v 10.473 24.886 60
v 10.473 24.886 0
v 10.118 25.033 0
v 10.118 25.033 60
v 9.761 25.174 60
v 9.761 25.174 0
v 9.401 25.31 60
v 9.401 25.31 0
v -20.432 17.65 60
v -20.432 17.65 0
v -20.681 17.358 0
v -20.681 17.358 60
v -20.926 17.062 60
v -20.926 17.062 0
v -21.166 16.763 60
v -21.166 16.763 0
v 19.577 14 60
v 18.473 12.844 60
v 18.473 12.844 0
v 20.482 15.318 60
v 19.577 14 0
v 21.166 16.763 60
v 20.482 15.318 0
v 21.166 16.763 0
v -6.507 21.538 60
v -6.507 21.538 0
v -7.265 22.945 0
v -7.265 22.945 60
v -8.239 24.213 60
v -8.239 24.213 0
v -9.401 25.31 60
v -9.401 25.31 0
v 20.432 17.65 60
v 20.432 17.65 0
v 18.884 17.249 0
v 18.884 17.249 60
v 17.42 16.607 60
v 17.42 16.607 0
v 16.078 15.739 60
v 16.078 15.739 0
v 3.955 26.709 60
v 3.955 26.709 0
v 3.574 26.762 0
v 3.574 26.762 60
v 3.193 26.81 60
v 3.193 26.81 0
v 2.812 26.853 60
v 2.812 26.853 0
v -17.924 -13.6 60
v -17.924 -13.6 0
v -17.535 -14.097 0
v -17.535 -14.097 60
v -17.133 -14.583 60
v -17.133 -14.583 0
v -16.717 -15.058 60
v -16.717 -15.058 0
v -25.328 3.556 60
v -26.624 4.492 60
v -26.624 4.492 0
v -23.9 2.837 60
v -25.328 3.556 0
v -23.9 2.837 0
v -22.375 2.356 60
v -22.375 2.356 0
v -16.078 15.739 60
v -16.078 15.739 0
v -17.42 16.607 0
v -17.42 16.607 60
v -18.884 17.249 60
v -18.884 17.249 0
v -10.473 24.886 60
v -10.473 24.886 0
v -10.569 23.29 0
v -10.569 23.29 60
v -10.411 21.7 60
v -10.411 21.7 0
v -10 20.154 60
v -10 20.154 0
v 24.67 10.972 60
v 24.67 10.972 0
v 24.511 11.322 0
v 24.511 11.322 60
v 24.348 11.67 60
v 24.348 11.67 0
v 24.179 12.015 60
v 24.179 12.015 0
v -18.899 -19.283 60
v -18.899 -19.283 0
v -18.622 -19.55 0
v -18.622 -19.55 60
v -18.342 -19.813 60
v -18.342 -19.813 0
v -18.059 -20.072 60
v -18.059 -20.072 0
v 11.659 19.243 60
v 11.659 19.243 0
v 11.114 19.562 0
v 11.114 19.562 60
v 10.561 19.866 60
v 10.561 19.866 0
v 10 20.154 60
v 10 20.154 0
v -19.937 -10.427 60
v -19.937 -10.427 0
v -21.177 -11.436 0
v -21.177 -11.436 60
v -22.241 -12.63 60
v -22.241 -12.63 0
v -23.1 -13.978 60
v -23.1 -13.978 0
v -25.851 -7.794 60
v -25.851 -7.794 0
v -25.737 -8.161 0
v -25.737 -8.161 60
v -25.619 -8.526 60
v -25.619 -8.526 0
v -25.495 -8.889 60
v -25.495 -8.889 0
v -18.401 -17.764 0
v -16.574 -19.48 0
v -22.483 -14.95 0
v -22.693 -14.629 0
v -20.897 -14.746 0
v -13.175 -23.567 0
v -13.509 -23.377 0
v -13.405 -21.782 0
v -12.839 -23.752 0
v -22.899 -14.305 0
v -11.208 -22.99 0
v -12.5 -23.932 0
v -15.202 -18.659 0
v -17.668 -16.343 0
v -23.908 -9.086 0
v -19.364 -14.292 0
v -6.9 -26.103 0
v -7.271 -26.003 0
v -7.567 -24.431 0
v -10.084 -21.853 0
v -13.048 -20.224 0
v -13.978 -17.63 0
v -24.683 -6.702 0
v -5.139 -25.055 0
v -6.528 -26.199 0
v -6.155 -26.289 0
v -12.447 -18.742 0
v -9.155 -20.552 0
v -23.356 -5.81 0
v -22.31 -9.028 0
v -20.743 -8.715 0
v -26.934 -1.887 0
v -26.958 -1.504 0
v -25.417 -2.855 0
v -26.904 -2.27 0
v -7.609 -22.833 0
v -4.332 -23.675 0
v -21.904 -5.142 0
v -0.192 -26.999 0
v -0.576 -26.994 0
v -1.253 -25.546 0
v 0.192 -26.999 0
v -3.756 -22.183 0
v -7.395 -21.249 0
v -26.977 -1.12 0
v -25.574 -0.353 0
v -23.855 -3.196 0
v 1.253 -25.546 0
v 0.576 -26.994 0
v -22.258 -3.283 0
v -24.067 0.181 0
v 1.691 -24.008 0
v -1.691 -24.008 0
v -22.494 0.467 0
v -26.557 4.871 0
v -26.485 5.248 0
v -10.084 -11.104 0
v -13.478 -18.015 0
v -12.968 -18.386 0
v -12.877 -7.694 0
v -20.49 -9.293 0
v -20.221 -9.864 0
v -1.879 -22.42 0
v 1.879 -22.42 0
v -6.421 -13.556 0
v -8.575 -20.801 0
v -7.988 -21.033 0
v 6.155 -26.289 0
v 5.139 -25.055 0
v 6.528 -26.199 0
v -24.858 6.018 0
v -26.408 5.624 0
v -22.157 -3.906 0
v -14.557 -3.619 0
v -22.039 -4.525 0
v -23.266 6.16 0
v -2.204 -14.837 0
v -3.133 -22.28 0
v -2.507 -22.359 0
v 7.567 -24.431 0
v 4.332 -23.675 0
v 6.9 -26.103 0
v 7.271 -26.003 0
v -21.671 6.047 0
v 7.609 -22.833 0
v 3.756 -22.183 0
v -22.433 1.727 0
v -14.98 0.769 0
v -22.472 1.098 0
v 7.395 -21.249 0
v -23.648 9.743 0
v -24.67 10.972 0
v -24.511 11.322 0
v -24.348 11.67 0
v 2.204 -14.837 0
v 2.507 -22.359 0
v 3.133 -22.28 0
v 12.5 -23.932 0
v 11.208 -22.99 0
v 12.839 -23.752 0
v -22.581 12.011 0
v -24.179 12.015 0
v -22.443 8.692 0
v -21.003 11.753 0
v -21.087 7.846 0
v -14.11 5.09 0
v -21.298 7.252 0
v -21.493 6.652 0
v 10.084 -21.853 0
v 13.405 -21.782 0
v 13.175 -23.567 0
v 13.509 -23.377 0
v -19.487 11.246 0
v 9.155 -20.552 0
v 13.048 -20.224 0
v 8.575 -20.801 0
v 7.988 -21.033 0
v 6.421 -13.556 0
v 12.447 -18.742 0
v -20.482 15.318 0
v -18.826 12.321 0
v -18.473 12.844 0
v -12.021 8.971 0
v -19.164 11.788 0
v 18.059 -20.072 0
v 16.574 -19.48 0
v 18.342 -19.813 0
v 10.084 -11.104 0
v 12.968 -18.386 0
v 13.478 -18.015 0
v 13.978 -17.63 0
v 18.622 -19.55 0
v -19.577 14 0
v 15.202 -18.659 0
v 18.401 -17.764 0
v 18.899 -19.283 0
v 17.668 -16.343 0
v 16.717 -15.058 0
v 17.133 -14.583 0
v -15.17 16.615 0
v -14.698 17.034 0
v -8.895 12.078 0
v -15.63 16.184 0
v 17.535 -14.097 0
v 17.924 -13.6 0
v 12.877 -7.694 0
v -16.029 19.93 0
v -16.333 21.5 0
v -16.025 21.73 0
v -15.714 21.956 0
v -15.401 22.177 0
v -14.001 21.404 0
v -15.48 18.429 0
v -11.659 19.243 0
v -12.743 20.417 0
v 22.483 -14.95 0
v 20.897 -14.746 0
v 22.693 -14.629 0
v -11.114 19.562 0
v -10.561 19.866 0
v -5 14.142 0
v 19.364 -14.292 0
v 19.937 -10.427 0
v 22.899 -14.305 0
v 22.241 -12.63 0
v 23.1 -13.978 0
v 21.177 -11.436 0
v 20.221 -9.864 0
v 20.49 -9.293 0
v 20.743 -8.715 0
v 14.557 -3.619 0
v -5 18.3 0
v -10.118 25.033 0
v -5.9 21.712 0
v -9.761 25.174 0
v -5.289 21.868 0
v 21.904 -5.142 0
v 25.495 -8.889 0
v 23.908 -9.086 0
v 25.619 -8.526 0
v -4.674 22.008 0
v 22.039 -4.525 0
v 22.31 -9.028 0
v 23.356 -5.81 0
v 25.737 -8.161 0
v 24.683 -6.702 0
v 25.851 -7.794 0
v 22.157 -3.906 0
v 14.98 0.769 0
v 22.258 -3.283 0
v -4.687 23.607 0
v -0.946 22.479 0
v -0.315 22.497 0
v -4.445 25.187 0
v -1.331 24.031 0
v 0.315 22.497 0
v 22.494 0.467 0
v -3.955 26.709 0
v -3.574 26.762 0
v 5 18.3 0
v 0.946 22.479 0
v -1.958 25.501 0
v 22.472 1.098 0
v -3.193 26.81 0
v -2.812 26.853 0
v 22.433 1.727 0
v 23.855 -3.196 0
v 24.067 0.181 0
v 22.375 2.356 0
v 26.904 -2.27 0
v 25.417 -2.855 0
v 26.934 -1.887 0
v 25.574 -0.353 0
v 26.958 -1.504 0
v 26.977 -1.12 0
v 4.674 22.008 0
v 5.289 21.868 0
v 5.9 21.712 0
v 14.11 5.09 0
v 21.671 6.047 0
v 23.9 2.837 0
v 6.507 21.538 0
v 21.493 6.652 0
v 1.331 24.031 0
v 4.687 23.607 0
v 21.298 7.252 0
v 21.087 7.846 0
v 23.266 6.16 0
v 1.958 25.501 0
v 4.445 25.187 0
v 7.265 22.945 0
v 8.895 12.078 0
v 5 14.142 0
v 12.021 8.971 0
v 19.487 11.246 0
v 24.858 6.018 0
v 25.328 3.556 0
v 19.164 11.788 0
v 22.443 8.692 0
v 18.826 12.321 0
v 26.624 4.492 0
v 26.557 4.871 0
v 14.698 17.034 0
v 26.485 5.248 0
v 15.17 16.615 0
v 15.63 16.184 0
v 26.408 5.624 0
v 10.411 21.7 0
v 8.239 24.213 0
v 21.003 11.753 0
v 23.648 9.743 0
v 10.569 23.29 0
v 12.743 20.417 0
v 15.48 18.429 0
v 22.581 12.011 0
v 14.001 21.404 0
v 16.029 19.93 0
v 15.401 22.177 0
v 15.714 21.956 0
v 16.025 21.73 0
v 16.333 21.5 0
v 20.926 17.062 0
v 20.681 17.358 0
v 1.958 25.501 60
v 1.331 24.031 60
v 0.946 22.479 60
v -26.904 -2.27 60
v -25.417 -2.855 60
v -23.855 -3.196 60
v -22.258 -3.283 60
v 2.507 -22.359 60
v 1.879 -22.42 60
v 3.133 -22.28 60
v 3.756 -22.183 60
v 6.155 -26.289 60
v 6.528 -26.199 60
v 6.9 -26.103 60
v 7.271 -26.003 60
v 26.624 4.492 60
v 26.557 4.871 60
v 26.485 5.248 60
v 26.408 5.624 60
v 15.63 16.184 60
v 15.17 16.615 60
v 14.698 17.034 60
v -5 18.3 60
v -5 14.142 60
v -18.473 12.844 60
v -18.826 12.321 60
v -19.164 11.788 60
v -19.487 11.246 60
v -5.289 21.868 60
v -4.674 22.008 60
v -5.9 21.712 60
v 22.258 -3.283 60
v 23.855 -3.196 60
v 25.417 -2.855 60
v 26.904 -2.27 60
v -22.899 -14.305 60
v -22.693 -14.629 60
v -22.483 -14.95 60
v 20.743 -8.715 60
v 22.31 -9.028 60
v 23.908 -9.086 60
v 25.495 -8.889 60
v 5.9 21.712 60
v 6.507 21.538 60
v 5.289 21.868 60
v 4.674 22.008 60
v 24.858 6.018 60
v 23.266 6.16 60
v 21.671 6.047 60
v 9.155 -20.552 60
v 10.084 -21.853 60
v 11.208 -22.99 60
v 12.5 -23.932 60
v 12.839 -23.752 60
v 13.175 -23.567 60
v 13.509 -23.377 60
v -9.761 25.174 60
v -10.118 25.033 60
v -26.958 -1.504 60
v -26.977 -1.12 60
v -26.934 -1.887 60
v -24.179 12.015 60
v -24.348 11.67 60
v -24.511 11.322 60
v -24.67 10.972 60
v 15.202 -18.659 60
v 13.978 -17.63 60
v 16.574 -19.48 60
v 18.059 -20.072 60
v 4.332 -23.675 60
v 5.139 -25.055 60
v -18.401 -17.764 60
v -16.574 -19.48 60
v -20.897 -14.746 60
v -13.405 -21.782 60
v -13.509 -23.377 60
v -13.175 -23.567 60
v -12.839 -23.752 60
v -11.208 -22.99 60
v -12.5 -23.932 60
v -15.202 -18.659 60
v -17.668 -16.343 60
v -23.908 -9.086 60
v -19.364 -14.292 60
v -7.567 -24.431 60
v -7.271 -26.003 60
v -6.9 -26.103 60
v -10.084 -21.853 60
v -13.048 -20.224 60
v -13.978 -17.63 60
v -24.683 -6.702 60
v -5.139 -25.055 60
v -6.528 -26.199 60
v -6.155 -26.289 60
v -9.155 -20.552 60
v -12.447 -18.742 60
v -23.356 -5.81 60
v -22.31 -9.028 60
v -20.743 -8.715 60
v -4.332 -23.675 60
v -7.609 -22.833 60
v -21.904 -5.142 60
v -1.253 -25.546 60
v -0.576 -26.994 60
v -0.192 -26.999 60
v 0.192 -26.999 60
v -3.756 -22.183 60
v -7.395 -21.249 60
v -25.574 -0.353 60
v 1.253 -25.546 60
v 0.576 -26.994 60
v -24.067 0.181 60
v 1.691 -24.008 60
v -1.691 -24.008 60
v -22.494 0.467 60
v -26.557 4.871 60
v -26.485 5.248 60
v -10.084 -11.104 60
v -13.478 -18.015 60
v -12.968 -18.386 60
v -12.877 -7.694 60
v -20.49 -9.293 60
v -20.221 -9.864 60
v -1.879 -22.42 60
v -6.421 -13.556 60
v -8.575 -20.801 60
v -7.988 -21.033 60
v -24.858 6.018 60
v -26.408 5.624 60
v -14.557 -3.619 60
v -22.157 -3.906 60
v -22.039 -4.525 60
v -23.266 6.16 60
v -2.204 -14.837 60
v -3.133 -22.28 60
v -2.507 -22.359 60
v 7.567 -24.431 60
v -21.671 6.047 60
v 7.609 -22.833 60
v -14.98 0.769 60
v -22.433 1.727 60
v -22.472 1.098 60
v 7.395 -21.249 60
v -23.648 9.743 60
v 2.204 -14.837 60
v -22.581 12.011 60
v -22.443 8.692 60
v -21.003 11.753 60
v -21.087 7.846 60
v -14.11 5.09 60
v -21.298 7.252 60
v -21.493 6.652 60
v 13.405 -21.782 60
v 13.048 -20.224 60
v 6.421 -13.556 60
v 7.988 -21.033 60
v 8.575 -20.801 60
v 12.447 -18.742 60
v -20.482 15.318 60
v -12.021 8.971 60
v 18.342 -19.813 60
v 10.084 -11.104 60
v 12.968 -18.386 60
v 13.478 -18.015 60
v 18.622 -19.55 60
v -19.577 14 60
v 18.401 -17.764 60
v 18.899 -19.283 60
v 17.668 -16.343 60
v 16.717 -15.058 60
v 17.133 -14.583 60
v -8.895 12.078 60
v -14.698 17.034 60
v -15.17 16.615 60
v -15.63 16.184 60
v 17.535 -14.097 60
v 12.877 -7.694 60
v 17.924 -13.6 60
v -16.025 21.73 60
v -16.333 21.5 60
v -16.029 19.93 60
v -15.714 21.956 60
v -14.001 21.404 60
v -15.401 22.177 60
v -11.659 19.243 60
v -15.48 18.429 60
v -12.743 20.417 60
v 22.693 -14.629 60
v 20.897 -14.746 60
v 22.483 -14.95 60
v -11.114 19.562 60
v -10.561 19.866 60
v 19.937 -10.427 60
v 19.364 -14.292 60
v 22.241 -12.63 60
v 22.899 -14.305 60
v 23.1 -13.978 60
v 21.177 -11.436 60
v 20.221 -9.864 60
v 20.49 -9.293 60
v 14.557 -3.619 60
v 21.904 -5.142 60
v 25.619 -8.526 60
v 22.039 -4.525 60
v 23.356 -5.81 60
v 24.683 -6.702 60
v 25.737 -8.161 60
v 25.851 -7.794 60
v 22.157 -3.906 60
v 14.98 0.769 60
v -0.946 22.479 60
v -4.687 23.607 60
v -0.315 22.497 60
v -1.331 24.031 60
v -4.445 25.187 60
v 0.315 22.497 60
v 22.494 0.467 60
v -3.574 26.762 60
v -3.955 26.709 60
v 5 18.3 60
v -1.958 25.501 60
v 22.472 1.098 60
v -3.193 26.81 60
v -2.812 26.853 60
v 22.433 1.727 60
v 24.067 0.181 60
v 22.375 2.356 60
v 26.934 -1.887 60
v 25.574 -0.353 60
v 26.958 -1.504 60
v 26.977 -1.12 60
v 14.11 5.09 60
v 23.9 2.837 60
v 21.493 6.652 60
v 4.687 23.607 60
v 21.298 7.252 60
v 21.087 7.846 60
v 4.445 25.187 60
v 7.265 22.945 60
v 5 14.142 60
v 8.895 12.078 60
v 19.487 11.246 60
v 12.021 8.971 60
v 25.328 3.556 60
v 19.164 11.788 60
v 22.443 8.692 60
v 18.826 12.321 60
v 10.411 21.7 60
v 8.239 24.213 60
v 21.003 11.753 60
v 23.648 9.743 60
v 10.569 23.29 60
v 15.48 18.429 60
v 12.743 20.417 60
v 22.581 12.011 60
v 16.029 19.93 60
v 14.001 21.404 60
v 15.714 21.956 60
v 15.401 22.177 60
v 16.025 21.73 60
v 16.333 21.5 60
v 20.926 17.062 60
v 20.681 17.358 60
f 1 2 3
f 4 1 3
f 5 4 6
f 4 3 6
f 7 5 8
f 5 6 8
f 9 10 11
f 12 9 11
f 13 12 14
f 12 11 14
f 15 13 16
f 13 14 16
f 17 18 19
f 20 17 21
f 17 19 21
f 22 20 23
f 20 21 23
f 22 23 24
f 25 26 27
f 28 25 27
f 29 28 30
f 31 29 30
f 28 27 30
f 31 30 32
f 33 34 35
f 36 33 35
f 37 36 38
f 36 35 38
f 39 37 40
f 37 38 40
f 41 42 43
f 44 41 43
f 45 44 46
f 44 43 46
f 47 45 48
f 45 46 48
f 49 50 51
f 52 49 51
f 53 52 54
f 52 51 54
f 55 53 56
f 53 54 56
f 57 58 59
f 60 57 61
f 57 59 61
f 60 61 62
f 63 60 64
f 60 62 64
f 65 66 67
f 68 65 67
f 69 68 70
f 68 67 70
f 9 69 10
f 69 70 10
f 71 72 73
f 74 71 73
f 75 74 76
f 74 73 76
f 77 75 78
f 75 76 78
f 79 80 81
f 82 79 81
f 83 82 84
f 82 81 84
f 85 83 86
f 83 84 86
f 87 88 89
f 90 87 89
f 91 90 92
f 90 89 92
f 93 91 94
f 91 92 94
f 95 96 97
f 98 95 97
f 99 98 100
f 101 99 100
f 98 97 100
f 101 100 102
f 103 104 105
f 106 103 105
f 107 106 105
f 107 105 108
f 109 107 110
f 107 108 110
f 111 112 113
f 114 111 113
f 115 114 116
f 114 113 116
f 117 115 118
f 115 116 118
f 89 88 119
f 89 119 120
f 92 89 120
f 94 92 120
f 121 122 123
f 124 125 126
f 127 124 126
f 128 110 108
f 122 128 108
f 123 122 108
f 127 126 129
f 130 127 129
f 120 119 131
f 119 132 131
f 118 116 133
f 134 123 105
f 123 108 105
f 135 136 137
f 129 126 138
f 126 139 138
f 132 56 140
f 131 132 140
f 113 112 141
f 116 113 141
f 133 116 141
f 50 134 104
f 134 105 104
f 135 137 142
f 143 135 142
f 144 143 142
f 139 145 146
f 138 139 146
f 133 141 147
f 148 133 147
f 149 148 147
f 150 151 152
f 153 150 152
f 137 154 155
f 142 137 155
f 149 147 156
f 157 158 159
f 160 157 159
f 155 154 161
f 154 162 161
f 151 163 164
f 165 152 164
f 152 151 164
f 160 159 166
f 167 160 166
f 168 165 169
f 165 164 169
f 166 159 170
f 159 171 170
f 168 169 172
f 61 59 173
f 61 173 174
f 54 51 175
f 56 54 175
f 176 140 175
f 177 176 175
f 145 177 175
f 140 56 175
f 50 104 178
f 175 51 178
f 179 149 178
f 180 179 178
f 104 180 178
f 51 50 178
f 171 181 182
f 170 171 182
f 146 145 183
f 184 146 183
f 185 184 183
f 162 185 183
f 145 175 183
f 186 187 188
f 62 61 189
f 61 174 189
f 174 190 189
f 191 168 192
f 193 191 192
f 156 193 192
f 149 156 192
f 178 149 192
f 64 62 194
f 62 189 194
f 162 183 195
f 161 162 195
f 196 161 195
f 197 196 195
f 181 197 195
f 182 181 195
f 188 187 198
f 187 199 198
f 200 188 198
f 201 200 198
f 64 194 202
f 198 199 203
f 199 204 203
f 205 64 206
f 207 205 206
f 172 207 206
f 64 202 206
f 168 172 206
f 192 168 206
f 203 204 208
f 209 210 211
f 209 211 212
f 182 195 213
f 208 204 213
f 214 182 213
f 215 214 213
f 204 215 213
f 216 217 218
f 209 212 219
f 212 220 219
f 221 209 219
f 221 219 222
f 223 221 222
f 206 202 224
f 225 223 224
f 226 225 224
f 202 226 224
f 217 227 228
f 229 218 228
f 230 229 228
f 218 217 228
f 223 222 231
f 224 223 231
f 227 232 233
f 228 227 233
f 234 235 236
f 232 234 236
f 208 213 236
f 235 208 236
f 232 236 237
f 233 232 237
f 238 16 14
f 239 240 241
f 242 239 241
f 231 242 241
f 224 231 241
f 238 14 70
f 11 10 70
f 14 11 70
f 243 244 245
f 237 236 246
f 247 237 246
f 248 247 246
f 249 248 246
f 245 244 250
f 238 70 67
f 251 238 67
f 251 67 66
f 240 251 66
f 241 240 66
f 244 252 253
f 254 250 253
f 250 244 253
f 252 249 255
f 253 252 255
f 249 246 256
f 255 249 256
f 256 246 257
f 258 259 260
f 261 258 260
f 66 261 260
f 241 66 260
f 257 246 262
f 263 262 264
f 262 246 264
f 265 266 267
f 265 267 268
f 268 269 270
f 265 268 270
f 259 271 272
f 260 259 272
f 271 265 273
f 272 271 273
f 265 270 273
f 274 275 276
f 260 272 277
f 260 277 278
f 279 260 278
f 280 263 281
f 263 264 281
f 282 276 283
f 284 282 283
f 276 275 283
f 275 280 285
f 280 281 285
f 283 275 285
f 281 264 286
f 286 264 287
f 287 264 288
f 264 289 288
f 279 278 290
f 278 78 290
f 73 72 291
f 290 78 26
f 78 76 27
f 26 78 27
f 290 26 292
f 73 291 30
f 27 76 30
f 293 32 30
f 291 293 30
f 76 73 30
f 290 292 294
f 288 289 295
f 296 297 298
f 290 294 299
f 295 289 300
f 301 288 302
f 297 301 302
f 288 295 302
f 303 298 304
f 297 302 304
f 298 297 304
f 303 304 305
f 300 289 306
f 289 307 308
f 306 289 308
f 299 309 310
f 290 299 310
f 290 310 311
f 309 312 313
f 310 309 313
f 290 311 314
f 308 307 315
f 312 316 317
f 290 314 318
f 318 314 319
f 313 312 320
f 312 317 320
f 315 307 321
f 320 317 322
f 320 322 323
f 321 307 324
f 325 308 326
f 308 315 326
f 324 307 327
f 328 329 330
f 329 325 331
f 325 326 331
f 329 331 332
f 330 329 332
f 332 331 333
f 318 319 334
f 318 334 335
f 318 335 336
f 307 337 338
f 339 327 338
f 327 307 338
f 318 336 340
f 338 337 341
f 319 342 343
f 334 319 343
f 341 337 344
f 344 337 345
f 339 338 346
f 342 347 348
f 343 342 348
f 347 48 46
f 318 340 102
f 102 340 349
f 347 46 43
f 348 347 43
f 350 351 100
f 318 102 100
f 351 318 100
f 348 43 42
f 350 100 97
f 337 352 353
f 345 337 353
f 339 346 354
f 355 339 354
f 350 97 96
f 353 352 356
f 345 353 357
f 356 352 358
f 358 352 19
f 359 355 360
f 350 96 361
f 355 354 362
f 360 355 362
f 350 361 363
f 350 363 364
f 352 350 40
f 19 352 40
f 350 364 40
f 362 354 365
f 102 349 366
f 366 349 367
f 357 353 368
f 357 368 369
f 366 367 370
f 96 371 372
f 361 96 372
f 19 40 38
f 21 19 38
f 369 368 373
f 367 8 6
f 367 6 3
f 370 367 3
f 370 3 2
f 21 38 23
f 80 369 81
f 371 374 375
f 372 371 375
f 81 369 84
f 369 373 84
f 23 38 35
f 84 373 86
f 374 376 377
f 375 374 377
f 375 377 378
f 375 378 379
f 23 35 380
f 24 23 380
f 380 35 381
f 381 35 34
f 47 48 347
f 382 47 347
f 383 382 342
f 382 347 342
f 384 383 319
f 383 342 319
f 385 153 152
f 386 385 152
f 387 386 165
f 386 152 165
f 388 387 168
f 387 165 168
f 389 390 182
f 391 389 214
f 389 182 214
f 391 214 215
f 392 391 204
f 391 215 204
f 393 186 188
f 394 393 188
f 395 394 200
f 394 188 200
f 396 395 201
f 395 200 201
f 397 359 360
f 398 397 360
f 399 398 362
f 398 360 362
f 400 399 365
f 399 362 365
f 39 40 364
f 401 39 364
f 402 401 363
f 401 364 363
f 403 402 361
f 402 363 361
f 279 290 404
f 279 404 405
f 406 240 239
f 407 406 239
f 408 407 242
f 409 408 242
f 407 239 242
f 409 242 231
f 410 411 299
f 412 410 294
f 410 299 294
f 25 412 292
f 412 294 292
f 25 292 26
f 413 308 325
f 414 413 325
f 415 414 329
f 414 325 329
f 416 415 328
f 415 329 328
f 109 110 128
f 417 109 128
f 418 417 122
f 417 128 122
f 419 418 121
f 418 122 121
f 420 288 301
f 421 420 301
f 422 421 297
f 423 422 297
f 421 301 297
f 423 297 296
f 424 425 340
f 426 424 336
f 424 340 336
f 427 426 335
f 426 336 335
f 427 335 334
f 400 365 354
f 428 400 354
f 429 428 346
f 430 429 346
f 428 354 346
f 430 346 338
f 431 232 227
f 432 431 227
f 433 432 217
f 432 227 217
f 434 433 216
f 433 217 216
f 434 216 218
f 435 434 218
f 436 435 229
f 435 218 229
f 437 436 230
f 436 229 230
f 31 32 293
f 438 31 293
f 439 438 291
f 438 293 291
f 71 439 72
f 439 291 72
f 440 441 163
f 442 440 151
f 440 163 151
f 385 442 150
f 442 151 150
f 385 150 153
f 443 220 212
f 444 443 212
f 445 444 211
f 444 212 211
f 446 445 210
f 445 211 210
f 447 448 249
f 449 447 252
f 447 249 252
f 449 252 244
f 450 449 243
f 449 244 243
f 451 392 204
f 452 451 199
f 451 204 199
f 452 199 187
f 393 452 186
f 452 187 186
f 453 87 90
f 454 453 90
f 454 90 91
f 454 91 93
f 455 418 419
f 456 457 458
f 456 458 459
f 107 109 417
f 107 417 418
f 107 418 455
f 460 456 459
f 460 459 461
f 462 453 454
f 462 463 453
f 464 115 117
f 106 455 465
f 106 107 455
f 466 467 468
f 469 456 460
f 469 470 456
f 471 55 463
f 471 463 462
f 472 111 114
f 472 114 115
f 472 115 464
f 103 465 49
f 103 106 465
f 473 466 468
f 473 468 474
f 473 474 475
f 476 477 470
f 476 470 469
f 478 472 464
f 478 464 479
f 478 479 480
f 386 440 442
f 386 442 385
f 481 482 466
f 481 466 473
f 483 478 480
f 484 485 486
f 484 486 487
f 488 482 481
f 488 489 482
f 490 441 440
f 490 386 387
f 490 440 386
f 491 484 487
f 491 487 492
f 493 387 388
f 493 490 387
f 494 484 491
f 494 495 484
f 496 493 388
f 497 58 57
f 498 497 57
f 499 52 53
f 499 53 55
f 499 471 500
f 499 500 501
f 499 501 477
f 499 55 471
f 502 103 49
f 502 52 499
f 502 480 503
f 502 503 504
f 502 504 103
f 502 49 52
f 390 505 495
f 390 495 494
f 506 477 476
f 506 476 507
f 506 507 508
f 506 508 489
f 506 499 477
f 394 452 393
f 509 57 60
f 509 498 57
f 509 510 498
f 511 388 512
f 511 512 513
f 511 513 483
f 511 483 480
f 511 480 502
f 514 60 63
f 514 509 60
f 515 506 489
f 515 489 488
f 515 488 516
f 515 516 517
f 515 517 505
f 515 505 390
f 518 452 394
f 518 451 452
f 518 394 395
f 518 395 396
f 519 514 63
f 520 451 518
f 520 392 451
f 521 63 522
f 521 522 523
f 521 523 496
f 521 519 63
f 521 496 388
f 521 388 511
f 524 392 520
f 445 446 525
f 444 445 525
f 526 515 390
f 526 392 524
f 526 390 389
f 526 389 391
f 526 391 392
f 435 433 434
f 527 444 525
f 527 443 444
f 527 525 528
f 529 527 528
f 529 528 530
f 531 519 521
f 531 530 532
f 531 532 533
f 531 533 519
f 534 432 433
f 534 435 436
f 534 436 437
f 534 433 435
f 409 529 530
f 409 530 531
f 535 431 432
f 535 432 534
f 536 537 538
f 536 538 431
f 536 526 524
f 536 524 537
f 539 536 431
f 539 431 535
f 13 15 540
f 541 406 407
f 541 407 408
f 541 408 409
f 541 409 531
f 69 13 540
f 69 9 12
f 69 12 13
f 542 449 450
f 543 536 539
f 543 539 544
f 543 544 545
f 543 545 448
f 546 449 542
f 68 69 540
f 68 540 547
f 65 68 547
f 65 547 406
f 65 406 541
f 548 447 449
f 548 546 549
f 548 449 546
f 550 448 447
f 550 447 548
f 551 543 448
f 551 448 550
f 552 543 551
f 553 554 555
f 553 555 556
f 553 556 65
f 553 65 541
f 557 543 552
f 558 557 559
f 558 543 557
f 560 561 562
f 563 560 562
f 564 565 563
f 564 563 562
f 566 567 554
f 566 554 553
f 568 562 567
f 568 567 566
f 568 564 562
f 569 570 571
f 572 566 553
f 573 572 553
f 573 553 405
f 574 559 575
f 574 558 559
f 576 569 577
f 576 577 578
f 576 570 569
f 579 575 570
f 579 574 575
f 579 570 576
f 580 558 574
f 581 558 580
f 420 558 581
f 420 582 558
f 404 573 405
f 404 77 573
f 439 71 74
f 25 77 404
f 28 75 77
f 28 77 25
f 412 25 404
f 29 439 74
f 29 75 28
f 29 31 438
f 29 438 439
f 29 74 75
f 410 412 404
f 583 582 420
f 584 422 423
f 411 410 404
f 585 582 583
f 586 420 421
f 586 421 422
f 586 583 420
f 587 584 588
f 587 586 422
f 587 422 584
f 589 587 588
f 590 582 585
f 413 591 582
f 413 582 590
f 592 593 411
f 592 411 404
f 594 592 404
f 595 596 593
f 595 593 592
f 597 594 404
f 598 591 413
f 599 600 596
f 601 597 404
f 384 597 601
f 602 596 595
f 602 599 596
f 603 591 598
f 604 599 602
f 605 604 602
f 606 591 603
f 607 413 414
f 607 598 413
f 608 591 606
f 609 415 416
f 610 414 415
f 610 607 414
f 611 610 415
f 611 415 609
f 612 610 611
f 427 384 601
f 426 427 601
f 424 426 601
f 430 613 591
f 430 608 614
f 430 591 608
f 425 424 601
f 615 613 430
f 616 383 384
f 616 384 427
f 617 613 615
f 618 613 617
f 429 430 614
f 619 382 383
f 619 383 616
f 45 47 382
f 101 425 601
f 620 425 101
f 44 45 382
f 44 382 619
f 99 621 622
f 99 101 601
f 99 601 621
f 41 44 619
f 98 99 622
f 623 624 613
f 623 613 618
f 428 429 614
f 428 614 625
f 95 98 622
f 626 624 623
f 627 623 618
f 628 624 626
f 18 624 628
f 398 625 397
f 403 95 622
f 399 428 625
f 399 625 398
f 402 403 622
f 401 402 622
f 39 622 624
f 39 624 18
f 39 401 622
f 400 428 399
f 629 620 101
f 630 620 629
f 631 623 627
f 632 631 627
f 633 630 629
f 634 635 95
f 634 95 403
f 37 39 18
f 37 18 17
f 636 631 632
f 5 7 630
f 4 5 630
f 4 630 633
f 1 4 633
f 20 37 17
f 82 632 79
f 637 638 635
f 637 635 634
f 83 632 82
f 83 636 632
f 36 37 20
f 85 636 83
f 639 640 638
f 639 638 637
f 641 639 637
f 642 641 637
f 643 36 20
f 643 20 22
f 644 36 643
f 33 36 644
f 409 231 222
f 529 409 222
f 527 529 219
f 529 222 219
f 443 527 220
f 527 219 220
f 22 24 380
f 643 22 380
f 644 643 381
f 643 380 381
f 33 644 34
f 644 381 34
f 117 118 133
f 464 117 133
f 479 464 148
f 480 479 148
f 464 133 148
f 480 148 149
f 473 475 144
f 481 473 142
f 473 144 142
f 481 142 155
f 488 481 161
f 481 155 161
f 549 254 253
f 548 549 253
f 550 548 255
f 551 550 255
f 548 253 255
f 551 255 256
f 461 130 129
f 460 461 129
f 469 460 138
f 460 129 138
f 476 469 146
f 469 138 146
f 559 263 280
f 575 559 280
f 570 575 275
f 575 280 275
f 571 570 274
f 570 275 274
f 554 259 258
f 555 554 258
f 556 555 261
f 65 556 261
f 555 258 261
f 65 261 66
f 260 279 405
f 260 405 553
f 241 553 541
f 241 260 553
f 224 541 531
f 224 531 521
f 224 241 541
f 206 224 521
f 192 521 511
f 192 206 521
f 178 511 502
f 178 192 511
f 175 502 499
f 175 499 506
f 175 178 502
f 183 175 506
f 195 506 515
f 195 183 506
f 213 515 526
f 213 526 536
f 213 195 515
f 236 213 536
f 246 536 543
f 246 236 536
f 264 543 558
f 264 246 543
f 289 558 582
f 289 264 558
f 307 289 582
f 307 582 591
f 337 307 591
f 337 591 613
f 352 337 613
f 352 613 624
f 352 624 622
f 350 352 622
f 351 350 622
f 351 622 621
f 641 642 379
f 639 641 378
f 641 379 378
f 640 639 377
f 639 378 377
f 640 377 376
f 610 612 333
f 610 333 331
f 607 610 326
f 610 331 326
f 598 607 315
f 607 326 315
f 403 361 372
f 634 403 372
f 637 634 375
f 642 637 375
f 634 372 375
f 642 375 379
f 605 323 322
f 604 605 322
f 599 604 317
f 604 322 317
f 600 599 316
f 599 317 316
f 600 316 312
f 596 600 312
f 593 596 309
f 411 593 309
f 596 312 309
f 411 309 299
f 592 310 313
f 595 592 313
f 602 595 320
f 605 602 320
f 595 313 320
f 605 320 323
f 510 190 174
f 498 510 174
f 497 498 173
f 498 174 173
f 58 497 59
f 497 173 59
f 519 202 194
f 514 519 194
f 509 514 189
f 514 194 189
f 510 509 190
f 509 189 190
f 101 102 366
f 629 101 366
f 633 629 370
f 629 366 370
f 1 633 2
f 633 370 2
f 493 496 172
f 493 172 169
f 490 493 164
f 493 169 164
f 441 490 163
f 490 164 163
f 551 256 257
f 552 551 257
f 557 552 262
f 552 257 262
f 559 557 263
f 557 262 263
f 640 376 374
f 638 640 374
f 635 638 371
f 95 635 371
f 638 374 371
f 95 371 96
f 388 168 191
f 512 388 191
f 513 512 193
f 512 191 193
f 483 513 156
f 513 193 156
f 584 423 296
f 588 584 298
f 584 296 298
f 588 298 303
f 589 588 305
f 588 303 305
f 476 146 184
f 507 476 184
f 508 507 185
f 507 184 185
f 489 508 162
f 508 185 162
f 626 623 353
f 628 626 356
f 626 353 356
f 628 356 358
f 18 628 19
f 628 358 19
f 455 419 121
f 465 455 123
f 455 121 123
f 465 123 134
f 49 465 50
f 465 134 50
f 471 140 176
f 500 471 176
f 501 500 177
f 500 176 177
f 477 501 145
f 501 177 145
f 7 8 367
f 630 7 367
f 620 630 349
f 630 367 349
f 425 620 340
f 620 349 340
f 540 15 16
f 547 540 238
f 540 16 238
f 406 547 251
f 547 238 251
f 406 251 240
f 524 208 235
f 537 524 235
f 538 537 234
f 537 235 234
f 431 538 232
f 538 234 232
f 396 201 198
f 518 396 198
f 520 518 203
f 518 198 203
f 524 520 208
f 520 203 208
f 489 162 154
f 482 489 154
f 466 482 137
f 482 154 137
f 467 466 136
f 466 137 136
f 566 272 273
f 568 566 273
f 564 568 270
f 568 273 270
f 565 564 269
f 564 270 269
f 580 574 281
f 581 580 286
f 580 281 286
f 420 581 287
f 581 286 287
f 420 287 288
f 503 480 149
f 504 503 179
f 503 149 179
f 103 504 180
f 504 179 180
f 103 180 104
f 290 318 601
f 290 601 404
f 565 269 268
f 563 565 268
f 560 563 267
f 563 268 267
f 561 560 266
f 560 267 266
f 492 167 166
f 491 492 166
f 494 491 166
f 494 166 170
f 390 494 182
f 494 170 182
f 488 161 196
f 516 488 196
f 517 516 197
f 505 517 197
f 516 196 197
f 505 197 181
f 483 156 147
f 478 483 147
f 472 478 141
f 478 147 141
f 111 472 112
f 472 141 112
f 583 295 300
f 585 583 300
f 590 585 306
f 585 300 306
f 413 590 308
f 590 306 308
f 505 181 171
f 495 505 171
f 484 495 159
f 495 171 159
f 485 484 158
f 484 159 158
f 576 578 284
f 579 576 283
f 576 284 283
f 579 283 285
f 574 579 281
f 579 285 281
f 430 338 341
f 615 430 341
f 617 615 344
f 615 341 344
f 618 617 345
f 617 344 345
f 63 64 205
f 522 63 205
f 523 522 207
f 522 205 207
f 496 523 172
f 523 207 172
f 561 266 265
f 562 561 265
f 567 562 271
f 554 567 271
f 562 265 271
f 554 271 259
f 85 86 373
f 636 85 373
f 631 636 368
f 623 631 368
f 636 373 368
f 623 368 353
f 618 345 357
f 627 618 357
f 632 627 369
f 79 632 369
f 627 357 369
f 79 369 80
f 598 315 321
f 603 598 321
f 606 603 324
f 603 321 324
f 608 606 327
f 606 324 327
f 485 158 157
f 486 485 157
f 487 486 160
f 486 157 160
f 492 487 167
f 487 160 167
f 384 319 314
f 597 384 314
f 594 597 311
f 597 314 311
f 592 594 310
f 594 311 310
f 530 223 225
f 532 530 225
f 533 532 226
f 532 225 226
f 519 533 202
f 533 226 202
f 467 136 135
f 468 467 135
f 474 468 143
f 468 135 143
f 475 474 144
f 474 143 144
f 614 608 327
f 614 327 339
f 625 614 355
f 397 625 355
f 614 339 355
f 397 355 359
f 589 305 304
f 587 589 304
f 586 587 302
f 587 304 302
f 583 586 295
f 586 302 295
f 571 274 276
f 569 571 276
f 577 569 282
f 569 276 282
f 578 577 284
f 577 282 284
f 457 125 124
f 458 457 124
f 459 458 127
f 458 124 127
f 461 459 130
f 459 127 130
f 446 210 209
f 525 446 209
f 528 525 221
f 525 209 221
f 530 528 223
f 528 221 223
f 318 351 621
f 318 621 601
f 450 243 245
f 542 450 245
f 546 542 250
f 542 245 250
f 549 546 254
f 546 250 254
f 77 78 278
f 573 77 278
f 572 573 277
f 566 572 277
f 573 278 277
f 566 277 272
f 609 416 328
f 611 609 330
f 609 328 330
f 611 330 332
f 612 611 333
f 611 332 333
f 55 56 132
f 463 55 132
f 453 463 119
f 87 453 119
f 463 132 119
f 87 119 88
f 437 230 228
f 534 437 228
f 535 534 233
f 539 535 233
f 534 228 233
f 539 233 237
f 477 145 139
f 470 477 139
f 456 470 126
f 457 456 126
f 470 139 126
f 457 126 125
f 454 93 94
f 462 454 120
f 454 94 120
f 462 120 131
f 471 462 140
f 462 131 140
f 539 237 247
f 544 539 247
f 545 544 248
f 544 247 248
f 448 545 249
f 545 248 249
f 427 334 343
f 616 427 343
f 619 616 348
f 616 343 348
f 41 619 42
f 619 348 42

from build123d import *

# Parameters (mm, degrees)
EXTRUDE_1_DEPTH = 60


with BuildPart() as part:
    # Model → 凸台-拉伸1 (new body)
    with BuildSketch(Plane.XY):
        with BuildLine():
            ThreePointArc((-26.623667603, 4.492251481), (-24.628342026, 3.167806143), (-22.375329871, 2.355761908))
            ThreePointArc((-22.375329871, 2.355761908), (-22.454603363, 1.412723899), (-22.494148969, 0.467186424))
            ThreePointArc((-22.494148969, 0.467186424), (-24.83117158, -0.056077302), (-26.976760436, -1.119998387))
            ThreePointArc((-26.976760436, -1.119998387), (-26.946721668, -1.695344027), (-26.904413642, -2.269917752))
            ThreePointArc((-26.904413642, -2.269917752), (-24.642398725, -3.056535912), (-22.258221901, -3.282766946))
            ThreePointArc((-22.258221901, -3.282766946), (-22.100480854, -4.215892197), (-21.903638454, -5.141558466))
            ThreePointArc((-21.903638454, -5.141558466), (-24.037108806, -6.229576789), (-25.850703628, -7.793659087))
            ThreePointArc((-25.850703628, -7.793659087), (-25.67852594, -8.343458848), (-25.494656424, -8.889459704))
            ThreePointArc((-25.494656424, -8.889459704), (-23.108082884, -9.088824574), (-20.742547988, -8.715027478))
            ThreePointArc((-20.742547988, -8.715027478), (-20.357703853, -9.579608281), (-19.93684178, -10.427240328))
            ThreePointArc((-19.93684178, -10.427240328), (-21.732706083, -12.011649055), (-23.100352038, -13.977615523))
            ThreePointArc((-23.100352038, -13.977615523), (-22.796853989, -14.467323464), (-22.48297618, -14.95044421))
            ThreePointArc((-22.48297618, -14.95044421), (-20.12180121, -14.550028962), (-17.9235435, -13.599690783))
            ThreePointArc((-17.9235435, -13.599690783), (-17.335777449, -14.341402345), (-16.717340013, -15.057740331))
            ThreePointArc((-16.717340013, -15.057740331), (-18.06275751, -17.038985236), (-18.898520373, -19.28330697))
            ThreePointArc((-18.898520373, -19.28330697), (-18.48277186, -19.68215294), (-18.058607856, -20.072037323))
            ThreePointArc((-18.058607856, -20.072037323), (-15.871192762, -19.097001519), (-13.978336856, -17.6298355))
            ThreePointArc((-13.978336856, -17.6298355), (-13.224580391, -18.202073356), (-12.447426292, -18.742107131))
            ThreePointArc((-12.447426292, -18.742107131), (-13.257859452, -20.995699309), (-13.509225169, -23.377357322))
            ThreePointArc((-13.509225169, -23.377357322), (-13.007349201, -23.660280361), (-12.499550786, -23.932430511))
            ThreePointArc((-12.499550786, -23.932430511), (-10.623338904, -22.444039237), (-9.154819898, -20.552232814))
            ThreePointArc((-9.154819898, -20.552232814), (-8.282434311, -20.919041156), (-7.395394998, -21.248838411))
            ThreePointArc((-7.395394998, -21.248838411), (-7.619921326, -23.633176378), (-7.271095664, -26.002522336))
            ThreePointArc((-7.271095664, -26.002522336), (-6.714626953, -26.15174535), (-6.15510097, -26.289061072))
            ThreePointArc((-6.15510097, -26.289061072), (-4.707981592, -24.380835426), (-3.756071937, -22.183257755))
            ThreePointArc((-3.756071937, -22.183257755), (-2.819872422, -22.321588665), (-1.878683838, -22.420427026))
            ThreePointArc((-1.878683838, -22.420427026), (-1.503195518, -24.785694058), (-0.576096477, -26.993853242))
            ThreePointArc((-0.576096477, -26.993853242), (0, -27), (0.576096477, -26.993853242))
            ThreePointArc((0.576096477, -26.993853242), (1.503195518, -24.785694058), (1.878683838, -22.420427026))
            ThreePointArc((1.878683838, -22.420427026), (2.819872422, -22.321588665), (3.756071937, -22.183257755))
            ThreePointArc((3.756071937, -22.183257755), (4.707981592, -24.380835426), (6.15510097, -26.289061072))
            ThreePointArc((6.15510097, -26.289061072), (6.714626953, -26.15174535), (7.271095664, -26.002522336))
            ThreePointArc((7.271095664, -26.002522336), (7.619921325, -23.633176378), (7.395394998, -21.248838411))
            ThreePointArc((7.395394998, -21.248838411), (8.282434311, -20.919041156), (9.154819898, -20.552232814))
            ThreePointArc((9.154819898, -20.552232814), (10.623338904, -22.444039237), (12.499550786, -23.932430511))
            ThreePointArc((12.499550786, -23.932430511), (13.007349201, -23.660280361), (13.509225169, -23.377357322))
            ThreePointArc((13.509225169, -23.377357322), (13.257859452, -20.995699309), (12.447426292, -18.742107131))
            ThreePointArc((12.447426292, -18.742107131), (13.224580391, -18.202073356), (13.978336856, -17.6298355))
            ThreePointArc((13.978336856, -17.6298355), (15.871192762, -19.097001519), (18.058607856, -20.072037323))
            ThreePointArc((18.058607856, -20.072037323), (18.48277186, -19.68215294), (18.898520373, -19.28330697))
            ThreePointArc((18.898520373, -19.28330697), (18.06275751, -17.038985236), (16.717340013, -15.057740331))
            ThreePointArc((16.717340013, -15.057740331), (17.335777449, -14.341402345), (17.9235435, -13.599690783))
            ThreePointArc((17.9235435, -13.599690783), (20.12180121, -14.550028962), (22.48297618, -14.95044421))
            ThreePointArc((22.48297618, -14.95044421), (22.796853989, -14.467323464), (23.100352038, -13.977615523))
            ThreePointArc((23.100352038, -13.977615523), (21.732706083, -12.011649055), (19.93684178, -10.427240328))
            ThreePointArc((19.93684178, -10.427240328), (20.357703853, -9.579608281), (20.742547988, -8.715027478))
            ThreePointArc((20.742547988, -8.715027478), (23.108082884, -9.088824574), (25.494656424, -8.889459704))
            ThreePointArc((25.494656424, -8.889459704), (25.67852594, -8.343458848), (25.850703628, -7.793659087))
            ThreePointArc((25.850703628, -7.793659087), (24.037108806, -6.229576789), (21.903638454, -5.141558466))
            ThreePointArc((21.903638454, -5.141558466), (22.100480854, -4.215892197), (22.258221901, -3.282766946))
            ThreePointArc((22.258221901, -3.282766946), (24.642398725, -3.056535912), (26.904413642, -2.269917752))
            ThreePointArc((26.904413642, -2.269917752), (26.946721668, -1.695344027), (26.976760436, -1.119998387))
            ThreePointArc((26.976760436, -1.119998387), (24.83117158, -0.056077302), (22.494148969, 0.467186424))
            ThreePointArc((22.494148969, 0.467186424), (22.454603363, 1.412723899), (22.375329871, 2.355761907))
            ThreePointArc((22.375329871, 2.355761907), (24.628342026, 3.167806143), (26.623667603, 4.492251481))
            ThreePointArc((26.623667603, 4.492251481), (26.52175577, 5.059295494), (26.407768172, 5.624035931))
            ThreePointArc((26.407768172, 5.624035931), (24.065000522, 6.120945728), (21.671269376, 6.046576272))
            ThreePointArc((21.671269376, 6.046576272), (21.39782056, 6.952573356), (21.086513575, 7.846269576))
            ThreePointArc((21.086513575, 7.846269576), (23.066796021, 9.193103287), (24.670058614, 10.972156033))
            ThreePointArc((24.670058614, 10.972156033), (24.430330417, 11.496040872), (24.179478714, 12.014691387))
            ThreePointArc((24.179478714, 12.014691387), (21.786736975, 11.913367227), (19.486704228, 11.246037495))
            ThreePointArc((19.486704228, 11.246037495), (18.996533996, 12.05556706), (18.47275408, 12.843767271))
            ThreePointArc((18.47275408, 12.843767271), (20.055878388, 14.640763942), (21.166339111, 16.762639667))
            ThreePointArc((21.166339111, 16.762639667), (20.803857555, 17.210447723), (20.431903681, 17.650419597))
            ThreePointArc((20.431903681, 17.650419597), (18.139532619, 16.957228049), (16.077717785, 15.738868823))
            ThreePointArc((16.077717785, 15.738868823), (15.401625336, 16.401065148), (14.698283508, 17.034243832))
            ThreePointArc((14.698283508, 17.034243832), (15.784776155, 19.168491554), (16.332660679, 21.499865003))
            ThreePointArc((16.332660679, 21.499865003), (15.870201812, 21.843458848), (15.400516998, 22.17710703))
            ThreePointArc((15.400516998, 22.17710703), (13.352554715, 20.935603868), (11.658509204, 19.242769139))
            ThreePointArc((11.658509204, 19.242769139), (10.838975914, 19.716023994), (10.000265727, 20.154396205))
            ThreePointArc((10.000265727, 20.154396205), (10.521858385, 22.491792344), (10.472741108, 24.88617475))
            ThreePointArc((10.472741108, 24.88617475), (9.939362922, 25.103965119), (9.401459192, 25.310325266))
            ThreePointArc((9.401459192, 25.310325266), (7.726586692, 23.5985187), (6.506753613, 21.5375755))
            ThreePointArc((6.506753613, 21.5375755), (5.595273771, 21.792152542), (4.673894472, 22.008173742))
            ThreePointArc((4.673894472, 22.008173742), (4.597813555, 24.401851103), (3.954780698, 26.708794612))
            ThreePointArc((3.954780698, 26.708794612), (3.383997306, 26.787096935), (2.811673129, 26.853202681))
            ThreePointArc((2.811673129, 26.853202681), (1.61512881, 24.778651813), (0.946154762, 22.479096783))
            ThreePointArc((0.946154762, 22.479096783), (0, 22.499), (-0.946154762, 22.479096783))
            ThreePointArc((-0.946154762, 22.479096783), (-1.61512881, 24.778651813), (-2.811673129, 26.853202681))
            ThreePointArc((-2.811673129, 26.853202681), (-3.383997306, 26.787096935), (-3.954780698, 26.708794612))
            ThreePointArc((-3.954780698, 26.708794612), (-4.597813555, 24.401851103), (-4.673894472, 22.008173742))
            ThreePointArc((-4.673894472, 22.008173742), (-5.595273771, 21.792152542), (-6.506753613, 21.5375755))
            ThreePointArc((-6.506753613, 21.5375755), (-7.726586692, 23.5985187), (-9.401459192, 25.310325266))
            ThreePointArc((-9.401459192, 25.310325266), (-9.939362922, 25.103965119), (-10.472741108, 24.88617475))
            ThreePointArc((-10.472741108, 24.88617475), (-10.521858385, 22.491792344), (-10.000265727, 20.154396205))
            ThreePointArc((-10.000265727, 20.154396205), (-10.838975914, 19.716023994), (-11.658509204, 19.242769139))
            ThreePointArc((-11.658509204, 19.242769139), (-13.352554715, 20.935603868), (-15.400516998, 22.17710703))
            ThreePointArc((-15.400516998, 22.17710703), (-15.870201812, 21.843458848), (-16.332660679, 21.499865003))
            ThreePointArc((-16.332660679, 21.499865003), (-15.784776155, 19.168491554), (-14.698283508, 17.034243832))
            ThreePointArc((-14.698283508, 17.034243832), (-15.401625336, 16.401065148), (-16.077717785, 15.738868823))
            ThreePointArc((-16.077717785, 15.738868823), (-18.139532619, 16.957228049), (-20.431903682, 17.650419597))
            ThreePointArc((-20.431903682, 17.650419597), (-20.803857555, 17.210447723), (-21.166339111, 16.762639667))
            ThreePointArc((-21.166339111, 16.762639667), (-20.055878388, 14.640763942), (-18.47275408, 12.843767271))
            ThreePointArc((-18.47275408, 12.843767271), (-18.996533996, 12.05556706), (-19.486704227, 11.246037495))
            ThreePointArc((-19.486704227, 11.246037495), (-21.786736975, 11.913367227), (-24.179478714, 12.014691387))
            ThreePointArc((-24.179478714, 12.014691387), (-24.430330417, 11.496040872), (-24.670058614, 10.972156033))
            ThreePointArc((-24.670058614, 10.972156033), (-23.066796021, 9.193103287), (-21.086513575, 7.846269576))
            ThreePointArc((-21.086513575, 7.846269576), (-21.39782056, 6.952573356), (-21.671269376, 6.046576272))
            ThreePointArc((-21.671269376, 6.046576272), (-24.065000522, 6.120945728), (-26.407768172, 5.624035931))
            ThreePointArc((-26.407768172, 5.624035931), (-26.52175577, 5.059295494), (-26.623667603, 4.492251481))
        make_face()
        with BuildLine():
            Line((5, 14.142135624), (5, 18.3))
            Line((5, 18.3), (-5, 18.3))
            Line((-5, 18.3), (-5, 14.142135624))
            ThreePointArc((-5, 14.142135624), (0, -15), (5, 14.142135624))
        make_face(mode=Mode.SUBTRACT)
    extrude(amount=EXTRUDE_1_DEPTH)


solid = part.part
